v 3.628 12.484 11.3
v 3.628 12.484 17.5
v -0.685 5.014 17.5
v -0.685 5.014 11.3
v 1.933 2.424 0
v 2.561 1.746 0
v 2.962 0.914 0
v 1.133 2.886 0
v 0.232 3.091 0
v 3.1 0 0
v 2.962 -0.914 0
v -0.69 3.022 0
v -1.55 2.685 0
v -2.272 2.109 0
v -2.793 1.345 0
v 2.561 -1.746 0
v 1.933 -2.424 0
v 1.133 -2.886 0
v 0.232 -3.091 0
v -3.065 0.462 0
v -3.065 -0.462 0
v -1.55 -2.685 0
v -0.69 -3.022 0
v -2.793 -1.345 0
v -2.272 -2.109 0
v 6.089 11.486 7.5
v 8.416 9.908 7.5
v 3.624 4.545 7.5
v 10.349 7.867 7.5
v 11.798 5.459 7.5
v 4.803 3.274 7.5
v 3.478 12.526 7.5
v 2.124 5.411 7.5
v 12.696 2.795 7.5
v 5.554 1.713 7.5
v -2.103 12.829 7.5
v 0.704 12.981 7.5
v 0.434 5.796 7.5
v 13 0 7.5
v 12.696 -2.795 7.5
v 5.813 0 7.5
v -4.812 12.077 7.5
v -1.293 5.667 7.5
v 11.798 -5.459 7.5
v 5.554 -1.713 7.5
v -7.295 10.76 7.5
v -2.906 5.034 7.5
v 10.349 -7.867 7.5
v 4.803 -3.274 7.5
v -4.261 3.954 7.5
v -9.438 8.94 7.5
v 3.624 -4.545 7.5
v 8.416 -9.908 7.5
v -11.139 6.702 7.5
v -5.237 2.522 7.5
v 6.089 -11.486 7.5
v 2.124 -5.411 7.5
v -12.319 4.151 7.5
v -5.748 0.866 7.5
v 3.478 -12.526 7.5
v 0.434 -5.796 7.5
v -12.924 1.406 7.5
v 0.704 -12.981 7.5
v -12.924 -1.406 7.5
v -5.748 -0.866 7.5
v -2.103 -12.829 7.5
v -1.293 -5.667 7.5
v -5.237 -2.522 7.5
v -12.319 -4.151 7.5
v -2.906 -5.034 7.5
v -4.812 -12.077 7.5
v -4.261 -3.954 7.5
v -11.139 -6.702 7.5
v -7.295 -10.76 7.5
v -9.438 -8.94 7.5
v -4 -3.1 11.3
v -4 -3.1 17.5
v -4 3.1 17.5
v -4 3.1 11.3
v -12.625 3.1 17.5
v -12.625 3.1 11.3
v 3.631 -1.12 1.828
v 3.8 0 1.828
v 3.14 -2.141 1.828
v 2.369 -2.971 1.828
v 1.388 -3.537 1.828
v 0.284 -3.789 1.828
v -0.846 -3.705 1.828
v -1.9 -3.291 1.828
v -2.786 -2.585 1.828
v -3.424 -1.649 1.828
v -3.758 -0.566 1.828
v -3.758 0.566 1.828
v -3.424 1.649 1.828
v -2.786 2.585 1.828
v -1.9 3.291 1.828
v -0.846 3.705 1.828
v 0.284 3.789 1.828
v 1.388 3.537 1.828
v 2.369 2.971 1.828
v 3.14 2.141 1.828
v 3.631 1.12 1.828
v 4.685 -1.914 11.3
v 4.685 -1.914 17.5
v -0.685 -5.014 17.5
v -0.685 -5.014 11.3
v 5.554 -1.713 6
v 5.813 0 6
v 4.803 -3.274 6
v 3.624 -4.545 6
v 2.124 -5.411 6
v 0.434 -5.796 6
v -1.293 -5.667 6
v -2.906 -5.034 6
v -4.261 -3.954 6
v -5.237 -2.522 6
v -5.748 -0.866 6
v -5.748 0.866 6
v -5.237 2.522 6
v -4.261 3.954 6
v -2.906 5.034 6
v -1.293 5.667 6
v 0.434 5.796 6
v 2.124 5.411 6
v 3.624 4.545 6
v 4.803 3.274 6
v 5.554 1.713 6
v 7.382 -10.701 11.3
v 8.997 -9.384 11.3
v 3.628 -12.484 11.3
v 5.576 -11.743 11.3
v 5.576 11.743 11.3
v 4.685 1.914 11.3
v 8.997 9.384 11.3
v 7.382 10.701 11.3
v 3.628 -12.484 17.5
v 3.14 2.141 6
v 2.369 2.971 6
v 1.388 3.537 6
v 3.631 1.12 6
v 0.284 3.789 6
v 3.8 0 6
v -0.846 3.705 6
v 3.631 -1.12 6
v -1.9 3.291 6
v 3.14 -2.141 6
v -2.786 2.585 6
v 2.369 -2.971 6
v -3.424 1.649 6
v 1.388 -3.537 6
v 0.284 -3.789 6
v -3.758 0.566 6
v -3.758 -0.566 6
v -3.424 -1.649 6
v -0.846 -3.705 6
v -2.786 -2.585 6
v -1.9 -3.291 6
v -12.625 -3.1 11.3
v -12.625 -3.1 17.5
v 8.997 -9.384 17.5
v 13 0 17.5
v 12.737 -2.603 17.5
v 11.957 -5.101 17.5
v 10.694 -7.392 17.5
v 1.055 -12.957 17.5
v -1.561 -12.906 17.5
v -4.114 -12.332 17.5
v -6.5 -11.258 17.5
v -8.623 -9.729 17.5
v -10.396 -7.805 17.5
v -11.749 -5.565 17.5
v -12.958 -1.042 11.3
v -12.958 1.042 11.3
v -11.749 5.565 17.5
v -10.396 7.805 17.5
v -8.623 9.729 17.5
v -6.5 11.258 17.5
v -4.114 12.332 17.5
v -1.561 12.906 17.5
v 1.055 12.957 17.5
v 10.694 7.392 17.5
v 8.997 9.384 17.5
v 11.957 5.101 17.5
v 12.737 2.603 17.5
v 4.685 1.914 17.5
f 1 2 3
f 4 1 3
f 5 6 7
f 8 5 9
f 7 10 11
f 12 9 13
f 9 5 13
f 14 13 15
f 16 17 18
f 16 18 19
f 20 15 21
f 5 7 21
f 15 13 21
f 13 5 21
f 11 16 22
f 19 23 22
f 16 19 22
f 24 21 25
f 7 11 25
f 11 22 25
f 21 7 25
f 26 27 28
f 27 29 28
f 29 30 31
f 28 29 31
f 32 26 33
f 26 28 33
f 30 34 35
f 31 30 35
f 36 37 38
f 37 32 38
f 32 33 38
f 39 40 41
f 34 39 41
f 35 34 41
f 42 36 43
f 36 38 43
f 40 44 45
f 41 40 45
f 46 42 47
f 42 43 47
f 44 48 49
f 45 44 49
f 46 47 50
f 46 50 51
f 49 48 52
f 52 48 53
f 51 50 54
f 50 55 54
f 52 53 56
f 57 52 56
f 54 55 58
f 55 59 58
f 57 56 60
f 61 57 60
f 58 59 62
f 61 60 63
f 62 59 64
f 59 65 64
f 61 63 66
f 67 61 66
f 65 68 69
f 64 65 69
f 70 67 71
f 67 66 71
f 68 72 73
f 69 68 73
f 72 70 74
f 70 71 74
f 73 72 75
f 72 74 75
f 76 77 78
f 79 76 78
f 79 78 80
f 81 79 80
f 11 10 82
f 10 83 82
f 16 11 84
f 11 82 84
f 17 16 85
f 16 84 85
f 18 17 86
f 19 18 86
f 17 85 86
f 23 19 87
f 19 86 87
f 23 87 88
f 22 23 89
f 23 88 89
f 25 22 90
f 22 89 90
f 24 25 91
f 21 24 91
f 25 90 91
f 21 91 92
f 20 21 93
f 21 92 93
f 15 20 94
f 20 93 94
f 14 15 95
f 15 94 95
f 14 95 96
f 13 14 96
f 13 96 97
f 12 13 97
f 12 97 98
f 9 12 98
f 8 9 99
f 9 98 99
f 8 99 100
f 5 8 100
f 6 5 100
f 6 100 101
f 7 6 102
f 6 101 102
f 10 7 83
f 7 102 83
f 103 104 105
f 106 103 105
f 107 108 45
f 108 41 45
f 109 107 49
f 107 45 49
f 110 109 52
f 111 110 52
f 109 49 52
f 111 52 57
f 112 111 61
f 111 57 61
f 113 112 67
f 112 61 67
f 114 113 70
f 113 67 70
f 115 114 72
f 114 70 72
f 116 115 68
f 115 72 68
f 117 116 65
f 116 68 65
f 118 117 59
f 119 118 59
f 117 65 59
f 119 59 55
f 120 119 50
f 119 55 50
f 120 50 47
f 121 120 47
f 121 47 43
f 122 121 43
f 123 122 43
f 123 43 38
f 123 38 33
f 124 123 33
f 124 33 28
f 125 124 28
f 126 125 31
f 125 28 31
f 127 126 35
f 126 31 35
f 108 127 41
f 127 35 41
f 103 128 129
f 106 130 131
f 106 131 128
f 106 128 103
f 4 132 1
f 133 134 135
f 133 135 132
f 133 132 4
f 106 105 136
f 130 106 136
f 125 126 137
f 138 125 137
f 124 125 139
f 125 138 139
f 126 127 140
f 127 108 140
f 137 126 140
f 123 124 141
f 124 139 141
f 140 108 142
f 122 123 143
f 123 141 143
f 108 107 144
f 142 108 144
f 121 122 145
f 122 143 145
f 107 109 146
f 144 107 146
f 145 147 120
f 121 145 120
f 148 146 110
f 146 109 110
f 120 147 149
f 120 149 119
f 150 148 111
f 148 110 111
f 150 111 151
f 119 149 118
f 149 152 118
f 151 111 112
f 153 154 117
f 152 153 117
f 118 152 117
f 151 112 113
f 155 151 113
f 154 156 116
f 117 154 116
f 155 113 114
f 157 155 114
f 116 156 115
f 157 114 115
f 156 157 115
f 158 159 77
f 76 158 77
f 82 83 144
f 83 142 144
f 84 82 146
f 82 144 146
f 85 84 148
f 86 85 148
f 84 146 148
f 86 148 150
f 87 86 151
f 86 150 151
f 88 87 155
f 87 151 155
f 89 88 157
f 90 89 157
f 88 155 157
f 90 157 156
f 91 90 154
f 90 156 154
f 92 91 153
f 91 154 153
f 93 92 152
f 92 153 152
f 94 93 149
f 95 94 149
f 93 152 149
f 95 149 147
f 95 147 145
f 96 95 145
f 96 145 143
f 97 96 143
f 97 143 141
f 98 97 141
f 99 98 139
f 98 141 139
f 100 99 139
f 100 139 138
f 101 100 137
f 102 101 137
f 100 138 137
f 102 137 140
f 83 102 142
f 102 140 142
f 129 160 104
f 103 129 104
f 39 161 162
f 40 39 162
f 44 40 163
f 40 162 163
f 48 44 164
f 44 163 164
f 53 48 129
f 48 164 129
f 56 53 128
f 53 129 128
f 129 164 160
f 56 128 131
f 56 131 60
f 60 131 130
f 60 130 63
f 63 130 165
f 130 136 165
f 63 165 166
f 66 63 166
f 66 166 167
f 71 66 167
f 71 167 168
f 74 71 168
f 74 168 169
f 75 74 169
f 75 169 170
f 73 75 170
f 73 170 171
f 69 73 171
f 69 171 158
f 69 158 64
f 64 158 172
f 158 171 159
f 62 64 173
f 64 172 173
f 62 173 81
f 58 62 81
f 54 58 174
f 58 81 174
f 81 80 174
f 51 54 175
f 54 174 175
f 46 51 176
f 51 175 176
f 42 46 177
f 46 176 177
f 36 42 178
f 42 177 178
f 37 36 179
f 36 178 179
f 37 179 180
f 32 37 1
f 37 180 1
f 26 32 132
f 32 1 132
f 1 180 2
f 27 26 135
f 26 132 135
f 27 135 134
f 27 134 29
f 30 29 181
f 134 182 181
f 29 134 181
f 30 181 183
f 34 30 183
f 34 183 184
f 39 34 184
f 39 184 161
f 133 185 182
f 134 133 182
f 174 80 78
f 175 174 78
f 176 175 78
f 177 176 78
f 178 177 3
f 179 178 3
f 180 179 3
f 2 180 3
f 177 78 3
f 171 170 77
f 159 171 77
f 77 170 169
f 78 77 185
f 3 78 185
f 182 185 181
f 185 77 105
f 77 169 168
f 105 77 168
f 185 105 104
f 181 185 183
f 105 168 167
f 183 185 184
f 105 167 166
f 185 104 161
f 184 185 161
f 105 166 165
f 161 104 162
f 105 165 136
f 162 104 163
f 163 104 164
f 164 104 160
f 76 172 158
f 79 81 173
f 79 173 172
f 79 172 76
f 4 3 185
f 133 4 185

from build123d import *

# Parameters (mm, degrees)
F3_DEPTH = 6.2
F4_COUNT = 3


with BuildPart() as f1:
    # F0 (on Front) → F1 (revolve)
    with BuildSketch(Plane.XZ):
        Polygon((0, 17.5), (0, 0), (3.1, 0), (3.8, 1.827984), (3.8, 6), (5.812653, 6), (5.812653, 7.5), (13, 7.5), (13, 17.5), align=None)
    revolve(axis=Axis((0, 0, 8.75), (0, 0, -1)))


with BuildPart() as f3:
    # F2 (on face) → F3 (new body)
    with BuildSketch(Plane.XY.offset(17.5)):
        with BuildLine():
            Line((-4, -3.1), (-4, 3.1))
            Line((-4, 3.1), (-12.624975, 3.1))
            ThreePointArc((-12.624975, 3.1), (-13, 0), (-12.624975, -3.1))
            Line((-12.624975, -3.1), (-4, -3.1))
        make_face()
    extrude(amount=-F3_DEPTH)


with BuildPart() as f4_1:
    # F4: instance of F3
    add(f3.part.rotate(Axis((0, 0, 17.5), (0, 0, -1)), 1 * 360 / F4_COUNT))


with BuildPart() as f4_2:
    # F4: instance of F3
    add(f3.part.rotate(Axis((0, 0, 17.5), (0, 0, -1)), 2 * 360 / F4_COUNT))


with BuildPart() as f1_1:
    add(f1.part)

    # F5: cut F3, F4_1, F4_2
    add(f3.part, mode=Mode.SUBTRACT)
    add(f4_1.part, mode=Mode.SUBTRACT)
    add(f4_2.part, mode=Mode.SUBTRACT)


solid = f1_1.part
